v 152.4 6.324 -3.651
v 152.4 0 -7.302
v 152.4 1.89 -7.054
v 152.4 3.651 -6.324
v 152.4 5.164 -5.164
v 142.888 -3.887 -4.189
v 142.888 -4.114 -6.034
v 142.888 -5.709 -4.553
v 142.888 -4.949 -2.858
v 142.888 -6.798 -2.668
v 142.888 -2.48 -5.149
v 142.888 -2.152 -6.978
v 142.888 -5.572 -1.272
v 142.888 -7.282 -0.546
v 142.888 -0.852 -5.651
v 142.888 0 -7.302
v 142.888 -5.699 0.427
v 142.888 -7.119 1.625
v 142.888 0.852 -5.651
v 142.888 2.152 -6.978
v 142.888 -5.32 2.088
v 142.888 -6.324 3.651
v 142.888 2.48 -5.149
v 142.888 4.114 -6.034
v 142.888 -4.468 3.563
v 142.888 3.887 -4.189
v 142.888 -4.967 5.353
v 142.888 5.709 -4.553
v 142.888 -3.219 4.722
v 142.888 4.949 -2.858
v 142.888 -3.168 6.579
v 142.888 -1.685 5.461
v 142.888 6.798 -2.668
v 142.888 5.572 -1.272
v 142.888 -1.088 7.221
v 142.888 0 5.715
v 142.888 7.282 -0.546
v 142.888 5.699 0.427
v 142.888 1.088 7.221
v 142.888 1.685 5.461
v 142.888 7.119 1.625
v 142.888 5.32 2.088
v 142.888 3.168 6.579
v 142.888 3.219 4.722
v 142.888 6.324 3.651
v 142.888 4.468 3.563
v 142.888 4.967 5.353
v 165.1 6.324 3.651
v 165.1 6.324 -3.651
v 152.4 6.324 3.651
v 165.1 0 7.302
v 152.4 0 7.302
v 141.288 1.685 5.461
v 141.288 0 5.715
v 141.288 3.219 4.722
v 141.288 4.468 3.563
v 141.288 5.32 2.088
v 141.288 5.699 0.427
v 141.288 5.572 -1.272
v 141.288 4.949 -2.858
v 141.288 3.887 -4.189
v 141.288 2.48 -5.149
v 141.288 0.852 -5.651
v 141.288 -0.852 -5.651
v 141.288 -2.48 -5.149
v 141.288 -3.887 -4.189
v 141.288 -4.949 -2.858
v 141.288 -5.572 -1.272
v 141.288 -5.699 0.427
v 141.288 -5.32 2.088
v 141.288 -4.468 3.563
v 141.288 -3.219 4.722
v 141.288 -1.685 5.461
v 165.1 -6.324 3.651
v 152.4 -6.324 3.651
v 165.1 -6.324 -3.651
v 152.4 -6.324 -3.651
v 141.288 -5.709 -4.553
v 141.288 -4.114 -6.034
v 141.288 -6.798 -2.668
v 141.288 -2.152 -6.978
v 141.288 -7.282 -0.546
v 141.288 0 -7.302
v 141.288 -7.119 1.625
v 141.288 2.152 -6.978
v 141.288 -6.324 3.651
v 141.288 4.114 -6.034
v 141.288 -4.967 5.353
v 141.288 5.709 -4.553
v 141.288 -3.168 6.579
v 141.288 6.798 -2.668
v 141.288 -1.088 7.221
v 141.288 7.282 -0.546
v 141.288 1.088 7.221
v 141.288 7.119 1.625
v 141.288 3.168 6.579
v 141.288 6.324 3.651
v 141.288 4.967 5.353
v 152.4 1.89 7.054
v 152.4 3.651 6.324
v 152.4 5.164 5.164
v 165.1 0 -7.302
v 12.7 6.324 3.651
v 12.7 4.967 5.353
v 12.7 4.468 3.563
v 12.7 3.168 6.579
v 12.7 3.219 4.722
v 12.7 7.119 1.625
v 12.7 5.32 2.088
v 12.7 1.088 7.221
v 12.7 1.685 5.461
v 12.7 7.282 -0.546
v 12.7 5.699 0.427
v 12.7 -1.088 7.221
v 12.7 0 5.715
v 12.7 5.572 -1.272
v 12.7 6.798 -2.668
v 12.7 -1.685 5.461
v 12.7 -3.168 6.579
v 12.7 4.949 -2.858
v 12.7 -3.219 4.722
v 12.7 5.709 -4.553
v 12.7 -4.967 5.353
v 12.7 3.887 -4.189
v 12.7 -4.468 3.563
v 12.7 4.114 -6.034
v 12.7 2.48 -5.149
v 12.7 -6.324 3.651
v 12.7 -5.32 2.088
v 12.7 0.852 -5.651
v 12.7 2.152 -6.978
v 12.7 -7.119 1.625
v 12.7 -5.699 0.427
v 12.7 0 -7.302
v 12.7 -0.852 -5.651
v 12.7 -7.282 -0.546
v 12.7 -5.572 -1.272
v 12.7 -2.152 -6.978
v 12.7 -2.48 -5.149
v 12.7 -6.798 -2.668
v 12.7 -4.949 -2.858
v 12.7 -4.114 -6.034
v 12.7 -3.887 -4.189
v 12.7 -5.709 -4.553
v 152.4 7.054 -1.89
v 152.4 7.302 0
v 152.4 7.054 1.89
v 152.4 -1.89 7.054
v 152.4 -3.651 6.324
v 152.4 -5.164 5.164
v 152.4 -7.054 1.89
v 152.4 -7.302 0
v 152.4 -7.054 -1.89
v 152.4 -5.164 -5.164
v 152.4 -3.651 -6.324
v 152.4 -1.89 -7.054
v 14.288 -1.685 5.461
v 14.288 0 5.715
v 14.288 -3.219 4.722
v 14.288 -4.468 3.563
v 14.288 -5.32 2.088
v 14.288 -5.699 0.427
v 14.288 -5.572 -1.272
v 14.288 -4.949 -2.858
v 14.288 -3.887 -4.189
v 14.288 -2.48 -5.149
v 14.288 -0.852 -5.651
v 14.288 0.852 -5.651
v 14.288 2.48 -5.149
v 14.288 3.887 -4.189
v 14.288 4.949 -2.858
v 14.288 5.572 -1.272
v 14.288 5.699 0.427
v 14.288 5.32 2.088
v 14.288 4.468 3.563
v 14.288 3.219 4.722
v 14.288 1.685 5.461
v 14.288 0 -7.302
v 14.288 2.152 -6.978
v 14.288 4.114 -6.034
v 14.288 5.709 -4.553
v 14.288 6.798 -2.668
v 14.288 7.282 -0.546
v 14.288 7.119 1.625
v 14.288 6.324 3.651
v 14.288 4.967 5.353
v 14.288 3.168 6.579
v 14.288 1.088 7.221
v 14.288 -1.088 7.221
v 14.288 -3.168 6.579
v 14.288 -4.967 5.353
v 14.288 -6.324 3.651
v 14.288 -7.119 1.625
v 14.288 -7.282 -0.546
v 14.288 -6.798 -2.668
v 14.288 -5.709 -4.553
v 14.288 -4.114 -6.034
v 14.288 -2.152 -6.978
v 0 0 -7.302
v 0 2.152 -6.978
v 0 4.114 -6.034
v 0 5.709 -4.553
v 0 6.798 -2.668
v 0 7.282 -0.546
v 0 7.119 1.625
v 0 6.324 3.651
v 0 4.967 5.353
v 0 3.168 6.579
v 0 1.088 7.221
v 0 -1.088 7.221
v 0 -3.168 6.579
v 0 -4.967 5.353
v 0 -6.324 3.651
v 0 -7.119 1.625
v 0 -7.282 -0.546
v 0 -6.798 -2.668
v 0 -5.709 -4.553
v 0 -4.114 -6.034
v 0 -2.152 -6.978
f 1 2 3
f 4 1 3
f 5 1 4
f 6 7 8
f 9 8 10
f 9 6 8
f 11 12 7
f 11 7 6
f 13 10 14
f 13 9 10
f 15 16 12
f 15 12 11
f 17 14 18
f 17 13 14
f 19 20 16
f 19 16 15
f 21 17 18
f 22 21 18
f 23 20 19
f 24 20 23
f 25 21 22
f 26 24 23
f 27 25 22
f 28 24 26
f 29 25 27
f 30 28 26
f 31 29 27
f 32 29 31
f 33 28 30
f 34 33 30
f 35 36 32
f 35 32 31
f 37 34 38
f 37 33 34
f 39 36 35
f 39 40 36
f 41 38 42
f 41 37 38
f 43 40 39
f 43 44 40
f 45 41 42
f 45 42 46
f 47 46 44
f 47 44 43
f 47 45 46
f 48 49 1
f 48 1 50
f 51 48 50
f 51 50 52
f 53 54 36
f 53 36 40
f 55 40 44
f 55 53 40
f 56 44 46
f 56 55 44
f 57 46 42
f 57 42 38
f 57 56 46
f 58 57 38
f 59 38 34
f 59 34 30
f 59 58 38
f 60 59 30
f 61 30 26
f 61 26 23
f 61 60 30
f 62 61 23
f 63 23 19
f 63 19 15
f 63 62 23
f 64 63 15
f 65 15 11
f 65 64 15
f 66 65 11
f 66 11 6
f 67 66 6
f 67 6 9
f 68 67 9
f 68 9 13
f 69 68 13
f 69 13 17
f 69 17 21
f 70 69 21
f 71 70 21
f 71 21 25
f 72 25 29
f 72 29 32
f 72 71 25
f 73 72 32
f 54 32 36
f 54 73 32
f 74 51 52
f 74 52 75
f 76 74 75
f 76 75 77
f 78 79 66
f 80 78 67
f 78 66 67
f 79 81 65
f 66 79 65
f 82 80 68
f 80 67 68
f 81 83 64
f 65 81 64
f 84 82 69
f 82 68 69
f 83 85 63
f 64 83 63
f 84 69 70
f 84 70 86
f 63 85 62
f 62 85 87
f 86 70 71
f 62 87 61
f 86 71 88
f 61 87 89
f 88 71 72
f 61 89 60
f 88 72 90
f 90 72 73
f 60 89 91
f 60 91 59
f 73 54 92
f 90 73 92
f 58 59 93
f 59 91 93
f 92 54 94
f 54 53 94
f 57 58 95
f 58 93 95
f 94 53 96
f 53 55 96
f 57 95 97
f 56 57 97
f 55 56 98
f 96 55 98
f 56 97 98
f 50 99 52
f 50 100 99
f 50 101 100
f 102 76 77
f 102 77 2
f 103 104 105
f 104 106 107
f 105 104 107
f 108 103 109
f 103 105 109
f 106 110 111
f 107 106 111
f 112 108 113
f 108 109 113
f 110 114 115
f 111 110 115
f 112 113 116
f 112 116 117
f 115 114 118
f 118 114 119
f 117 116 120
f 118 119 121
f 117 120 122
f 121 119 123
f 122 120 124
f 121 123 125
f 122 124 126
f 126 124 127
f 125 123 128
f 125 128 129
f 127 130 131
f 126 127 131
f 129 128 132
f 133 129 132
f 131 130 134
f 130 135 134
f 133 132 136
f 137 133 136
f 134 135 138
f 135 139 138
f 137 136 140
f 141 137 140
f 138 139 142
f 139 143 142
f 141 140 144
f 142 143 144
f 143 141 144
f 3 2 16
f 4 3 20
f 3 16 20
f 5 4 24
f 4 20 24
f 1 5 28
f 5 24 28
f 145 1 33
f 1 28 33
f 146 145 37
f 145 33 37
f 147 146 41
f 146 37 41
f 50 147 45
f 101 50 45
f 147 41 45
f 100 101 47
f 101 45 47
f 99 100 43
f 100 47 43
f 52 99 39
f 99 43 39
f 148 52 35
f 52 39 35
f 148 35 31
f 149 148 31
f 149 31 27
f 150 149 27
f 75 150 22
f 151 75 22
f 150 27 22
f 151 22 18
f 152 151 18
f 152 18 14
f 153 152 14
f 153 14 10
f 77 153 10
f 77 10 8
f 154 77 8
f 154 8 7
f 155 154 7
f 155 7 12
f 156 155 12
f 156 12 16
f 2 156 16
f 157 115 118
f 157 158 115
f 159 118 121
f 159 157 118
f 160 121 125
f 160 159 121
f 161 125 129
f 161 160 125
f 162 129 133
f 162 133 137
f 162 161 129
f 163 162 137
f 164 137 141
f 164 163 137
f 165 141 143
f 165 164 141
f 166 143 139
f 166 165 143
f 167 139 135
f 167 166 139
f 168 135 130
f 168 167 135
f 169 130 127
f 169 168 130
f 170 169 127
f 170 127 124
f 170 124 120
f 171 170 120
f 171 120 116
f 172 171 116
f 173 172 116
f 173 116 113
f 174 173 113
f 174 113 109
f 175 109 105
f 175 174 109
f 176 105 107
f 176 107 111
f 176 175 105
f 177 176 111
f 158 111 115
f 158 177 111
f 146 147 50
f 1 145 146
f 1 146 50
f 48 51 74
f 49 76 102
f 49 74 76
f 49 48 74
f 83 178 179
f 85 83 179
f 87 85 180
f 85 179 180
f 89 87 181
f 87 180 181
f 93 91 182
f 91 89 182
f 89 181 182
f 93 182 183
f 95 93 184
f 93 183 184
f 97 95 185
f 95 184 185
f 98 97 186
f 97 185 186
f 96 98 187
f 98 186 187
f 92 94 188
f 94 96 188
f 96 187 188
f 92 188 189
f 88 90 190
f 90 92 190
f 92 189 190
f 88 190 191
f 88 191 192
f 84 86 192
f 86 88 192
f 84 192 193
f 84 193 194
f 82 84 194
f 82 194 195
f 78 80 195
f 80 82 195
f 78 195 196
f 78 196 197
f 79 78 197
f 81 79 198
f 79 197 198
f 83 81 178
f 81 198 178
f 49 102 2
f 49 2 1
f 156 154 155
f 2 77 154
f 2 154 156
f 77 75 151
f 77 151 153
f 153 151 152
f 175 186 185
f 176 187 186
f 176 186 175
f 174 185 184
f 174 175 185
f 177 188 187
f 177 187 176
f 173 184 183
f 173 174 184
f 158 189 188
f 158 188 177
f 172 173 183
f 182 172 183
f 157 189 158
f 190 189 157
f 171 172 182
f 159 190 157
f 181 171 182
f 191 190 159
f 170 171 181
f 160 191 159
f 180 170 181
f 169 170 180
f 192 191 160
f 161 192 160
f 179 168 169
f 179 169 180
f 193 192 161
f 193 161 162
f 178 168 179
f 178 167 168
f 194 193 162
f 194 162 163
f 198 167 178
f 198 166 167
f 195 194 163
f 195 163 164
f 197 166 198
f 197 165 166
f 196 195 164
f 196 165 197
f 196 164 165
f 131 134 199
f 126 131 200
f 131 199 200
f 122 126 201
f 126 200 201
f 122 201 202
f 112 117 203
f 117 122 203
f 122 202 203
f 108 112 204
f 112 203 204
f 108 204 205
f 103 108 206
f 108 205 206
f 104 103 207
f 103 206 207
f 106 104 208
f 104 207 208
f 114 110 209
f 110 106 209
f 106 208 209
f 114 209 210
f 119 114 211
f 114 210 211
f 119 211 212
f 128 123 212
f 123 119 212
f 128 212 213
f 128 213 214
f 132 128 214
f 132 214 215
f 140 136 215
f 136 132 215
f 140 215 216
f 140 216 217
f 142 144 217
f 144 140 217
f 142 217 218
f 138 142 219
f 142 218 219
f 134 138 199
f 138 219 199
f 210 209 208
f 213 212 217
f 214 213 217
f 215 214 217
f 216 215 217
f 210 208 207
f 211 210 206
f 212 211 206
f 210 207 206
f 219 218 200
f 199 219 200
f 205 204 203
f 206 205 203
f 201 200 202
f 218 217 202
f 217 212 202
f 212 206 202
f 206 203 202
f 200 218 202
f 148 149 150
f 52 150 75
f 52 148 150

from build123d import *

# Parameters (mm, degrees)
SKETCH1_R           = 7.3025
BOSS_EXTRUDE1_DEPTH = 165.1
SKETCH2_W           = 1.5875
SKETCH2_H           = 1.5875
SKETCH4_R           = 7.3025
SKETCH4_R_2         = 5.715
CUT_EXTRUDE1_DEPTH  = 1.6002
SKETCH5_OUTSIDE_W   = 49.882
SKETCH5_OUTSIDE_H   = 49.882
CUT_EXTRUDE2_DEPTH  = 12.7


with BuildPart() as part:
    # Sketch1 → Boss-Extrude1 (new body)
    with BuildSketch(Plane(origin=(0, 0, 0), x_dir=(0, 0, -1), z_dir=(1, 0, 0))):
        Circle(SKETCH1_R)
    extrude(amount=BOSS_EXTRUDE1_DEPTH)

    # Sketch2 → Groove (revolve, cut)
    with BuildSketch(Plane.XY, mode=Mode.PRIVATE) as groove_sk:
        with Locations((13.49375, 6.50875)):
            Rectangle(SKETCH2_W, SKETCH2_H)
    revolve(groove_sk.sketch.rotate(Axis((0, 0, 0), (1, 0, 0)), 90), axis=Axis((0, 0, 0), (1, 0, 0)), mode=Mode.SUBTRACT)

    # Sketch4 → Cut-Extrude1 (cut)
    with BuildSketch(Plane.ZY.offset(-141.2875)):
        Circle(SKETCH4_R)
        Circle(SKETCH4_R_2, mode=Mode.SUBTRACT)
    extrude(amount=-CUT_EXTRUDE1_DEPTH, mode=Mode.SUBTRACT)

    # Sketch5 outside → Cut-Extrude2 (cut)
    with BuildSketch(Plane(origin=(165.1, 0, 0), x_dir=(0, 0, -1), z_dir=(1, 0, 0))):
        Rectangle(SKETCH5_OUTSIDE_W, SKETCH5_OUTSIDE_H)
        Polygon((7.3025, 0), (3.65125, 6.324150511), (-3.65125, 6.324150511), (-7.3025, 0), (-3.65125, -6.324150511), (3.65125, -6.324150511), align=None, mode=Mode.SUBTRACT)
    extrude(amount=-CUT_EXTRUDE2_DEPTH, mode=Mode.SUBTRACT)


solid = part.part
